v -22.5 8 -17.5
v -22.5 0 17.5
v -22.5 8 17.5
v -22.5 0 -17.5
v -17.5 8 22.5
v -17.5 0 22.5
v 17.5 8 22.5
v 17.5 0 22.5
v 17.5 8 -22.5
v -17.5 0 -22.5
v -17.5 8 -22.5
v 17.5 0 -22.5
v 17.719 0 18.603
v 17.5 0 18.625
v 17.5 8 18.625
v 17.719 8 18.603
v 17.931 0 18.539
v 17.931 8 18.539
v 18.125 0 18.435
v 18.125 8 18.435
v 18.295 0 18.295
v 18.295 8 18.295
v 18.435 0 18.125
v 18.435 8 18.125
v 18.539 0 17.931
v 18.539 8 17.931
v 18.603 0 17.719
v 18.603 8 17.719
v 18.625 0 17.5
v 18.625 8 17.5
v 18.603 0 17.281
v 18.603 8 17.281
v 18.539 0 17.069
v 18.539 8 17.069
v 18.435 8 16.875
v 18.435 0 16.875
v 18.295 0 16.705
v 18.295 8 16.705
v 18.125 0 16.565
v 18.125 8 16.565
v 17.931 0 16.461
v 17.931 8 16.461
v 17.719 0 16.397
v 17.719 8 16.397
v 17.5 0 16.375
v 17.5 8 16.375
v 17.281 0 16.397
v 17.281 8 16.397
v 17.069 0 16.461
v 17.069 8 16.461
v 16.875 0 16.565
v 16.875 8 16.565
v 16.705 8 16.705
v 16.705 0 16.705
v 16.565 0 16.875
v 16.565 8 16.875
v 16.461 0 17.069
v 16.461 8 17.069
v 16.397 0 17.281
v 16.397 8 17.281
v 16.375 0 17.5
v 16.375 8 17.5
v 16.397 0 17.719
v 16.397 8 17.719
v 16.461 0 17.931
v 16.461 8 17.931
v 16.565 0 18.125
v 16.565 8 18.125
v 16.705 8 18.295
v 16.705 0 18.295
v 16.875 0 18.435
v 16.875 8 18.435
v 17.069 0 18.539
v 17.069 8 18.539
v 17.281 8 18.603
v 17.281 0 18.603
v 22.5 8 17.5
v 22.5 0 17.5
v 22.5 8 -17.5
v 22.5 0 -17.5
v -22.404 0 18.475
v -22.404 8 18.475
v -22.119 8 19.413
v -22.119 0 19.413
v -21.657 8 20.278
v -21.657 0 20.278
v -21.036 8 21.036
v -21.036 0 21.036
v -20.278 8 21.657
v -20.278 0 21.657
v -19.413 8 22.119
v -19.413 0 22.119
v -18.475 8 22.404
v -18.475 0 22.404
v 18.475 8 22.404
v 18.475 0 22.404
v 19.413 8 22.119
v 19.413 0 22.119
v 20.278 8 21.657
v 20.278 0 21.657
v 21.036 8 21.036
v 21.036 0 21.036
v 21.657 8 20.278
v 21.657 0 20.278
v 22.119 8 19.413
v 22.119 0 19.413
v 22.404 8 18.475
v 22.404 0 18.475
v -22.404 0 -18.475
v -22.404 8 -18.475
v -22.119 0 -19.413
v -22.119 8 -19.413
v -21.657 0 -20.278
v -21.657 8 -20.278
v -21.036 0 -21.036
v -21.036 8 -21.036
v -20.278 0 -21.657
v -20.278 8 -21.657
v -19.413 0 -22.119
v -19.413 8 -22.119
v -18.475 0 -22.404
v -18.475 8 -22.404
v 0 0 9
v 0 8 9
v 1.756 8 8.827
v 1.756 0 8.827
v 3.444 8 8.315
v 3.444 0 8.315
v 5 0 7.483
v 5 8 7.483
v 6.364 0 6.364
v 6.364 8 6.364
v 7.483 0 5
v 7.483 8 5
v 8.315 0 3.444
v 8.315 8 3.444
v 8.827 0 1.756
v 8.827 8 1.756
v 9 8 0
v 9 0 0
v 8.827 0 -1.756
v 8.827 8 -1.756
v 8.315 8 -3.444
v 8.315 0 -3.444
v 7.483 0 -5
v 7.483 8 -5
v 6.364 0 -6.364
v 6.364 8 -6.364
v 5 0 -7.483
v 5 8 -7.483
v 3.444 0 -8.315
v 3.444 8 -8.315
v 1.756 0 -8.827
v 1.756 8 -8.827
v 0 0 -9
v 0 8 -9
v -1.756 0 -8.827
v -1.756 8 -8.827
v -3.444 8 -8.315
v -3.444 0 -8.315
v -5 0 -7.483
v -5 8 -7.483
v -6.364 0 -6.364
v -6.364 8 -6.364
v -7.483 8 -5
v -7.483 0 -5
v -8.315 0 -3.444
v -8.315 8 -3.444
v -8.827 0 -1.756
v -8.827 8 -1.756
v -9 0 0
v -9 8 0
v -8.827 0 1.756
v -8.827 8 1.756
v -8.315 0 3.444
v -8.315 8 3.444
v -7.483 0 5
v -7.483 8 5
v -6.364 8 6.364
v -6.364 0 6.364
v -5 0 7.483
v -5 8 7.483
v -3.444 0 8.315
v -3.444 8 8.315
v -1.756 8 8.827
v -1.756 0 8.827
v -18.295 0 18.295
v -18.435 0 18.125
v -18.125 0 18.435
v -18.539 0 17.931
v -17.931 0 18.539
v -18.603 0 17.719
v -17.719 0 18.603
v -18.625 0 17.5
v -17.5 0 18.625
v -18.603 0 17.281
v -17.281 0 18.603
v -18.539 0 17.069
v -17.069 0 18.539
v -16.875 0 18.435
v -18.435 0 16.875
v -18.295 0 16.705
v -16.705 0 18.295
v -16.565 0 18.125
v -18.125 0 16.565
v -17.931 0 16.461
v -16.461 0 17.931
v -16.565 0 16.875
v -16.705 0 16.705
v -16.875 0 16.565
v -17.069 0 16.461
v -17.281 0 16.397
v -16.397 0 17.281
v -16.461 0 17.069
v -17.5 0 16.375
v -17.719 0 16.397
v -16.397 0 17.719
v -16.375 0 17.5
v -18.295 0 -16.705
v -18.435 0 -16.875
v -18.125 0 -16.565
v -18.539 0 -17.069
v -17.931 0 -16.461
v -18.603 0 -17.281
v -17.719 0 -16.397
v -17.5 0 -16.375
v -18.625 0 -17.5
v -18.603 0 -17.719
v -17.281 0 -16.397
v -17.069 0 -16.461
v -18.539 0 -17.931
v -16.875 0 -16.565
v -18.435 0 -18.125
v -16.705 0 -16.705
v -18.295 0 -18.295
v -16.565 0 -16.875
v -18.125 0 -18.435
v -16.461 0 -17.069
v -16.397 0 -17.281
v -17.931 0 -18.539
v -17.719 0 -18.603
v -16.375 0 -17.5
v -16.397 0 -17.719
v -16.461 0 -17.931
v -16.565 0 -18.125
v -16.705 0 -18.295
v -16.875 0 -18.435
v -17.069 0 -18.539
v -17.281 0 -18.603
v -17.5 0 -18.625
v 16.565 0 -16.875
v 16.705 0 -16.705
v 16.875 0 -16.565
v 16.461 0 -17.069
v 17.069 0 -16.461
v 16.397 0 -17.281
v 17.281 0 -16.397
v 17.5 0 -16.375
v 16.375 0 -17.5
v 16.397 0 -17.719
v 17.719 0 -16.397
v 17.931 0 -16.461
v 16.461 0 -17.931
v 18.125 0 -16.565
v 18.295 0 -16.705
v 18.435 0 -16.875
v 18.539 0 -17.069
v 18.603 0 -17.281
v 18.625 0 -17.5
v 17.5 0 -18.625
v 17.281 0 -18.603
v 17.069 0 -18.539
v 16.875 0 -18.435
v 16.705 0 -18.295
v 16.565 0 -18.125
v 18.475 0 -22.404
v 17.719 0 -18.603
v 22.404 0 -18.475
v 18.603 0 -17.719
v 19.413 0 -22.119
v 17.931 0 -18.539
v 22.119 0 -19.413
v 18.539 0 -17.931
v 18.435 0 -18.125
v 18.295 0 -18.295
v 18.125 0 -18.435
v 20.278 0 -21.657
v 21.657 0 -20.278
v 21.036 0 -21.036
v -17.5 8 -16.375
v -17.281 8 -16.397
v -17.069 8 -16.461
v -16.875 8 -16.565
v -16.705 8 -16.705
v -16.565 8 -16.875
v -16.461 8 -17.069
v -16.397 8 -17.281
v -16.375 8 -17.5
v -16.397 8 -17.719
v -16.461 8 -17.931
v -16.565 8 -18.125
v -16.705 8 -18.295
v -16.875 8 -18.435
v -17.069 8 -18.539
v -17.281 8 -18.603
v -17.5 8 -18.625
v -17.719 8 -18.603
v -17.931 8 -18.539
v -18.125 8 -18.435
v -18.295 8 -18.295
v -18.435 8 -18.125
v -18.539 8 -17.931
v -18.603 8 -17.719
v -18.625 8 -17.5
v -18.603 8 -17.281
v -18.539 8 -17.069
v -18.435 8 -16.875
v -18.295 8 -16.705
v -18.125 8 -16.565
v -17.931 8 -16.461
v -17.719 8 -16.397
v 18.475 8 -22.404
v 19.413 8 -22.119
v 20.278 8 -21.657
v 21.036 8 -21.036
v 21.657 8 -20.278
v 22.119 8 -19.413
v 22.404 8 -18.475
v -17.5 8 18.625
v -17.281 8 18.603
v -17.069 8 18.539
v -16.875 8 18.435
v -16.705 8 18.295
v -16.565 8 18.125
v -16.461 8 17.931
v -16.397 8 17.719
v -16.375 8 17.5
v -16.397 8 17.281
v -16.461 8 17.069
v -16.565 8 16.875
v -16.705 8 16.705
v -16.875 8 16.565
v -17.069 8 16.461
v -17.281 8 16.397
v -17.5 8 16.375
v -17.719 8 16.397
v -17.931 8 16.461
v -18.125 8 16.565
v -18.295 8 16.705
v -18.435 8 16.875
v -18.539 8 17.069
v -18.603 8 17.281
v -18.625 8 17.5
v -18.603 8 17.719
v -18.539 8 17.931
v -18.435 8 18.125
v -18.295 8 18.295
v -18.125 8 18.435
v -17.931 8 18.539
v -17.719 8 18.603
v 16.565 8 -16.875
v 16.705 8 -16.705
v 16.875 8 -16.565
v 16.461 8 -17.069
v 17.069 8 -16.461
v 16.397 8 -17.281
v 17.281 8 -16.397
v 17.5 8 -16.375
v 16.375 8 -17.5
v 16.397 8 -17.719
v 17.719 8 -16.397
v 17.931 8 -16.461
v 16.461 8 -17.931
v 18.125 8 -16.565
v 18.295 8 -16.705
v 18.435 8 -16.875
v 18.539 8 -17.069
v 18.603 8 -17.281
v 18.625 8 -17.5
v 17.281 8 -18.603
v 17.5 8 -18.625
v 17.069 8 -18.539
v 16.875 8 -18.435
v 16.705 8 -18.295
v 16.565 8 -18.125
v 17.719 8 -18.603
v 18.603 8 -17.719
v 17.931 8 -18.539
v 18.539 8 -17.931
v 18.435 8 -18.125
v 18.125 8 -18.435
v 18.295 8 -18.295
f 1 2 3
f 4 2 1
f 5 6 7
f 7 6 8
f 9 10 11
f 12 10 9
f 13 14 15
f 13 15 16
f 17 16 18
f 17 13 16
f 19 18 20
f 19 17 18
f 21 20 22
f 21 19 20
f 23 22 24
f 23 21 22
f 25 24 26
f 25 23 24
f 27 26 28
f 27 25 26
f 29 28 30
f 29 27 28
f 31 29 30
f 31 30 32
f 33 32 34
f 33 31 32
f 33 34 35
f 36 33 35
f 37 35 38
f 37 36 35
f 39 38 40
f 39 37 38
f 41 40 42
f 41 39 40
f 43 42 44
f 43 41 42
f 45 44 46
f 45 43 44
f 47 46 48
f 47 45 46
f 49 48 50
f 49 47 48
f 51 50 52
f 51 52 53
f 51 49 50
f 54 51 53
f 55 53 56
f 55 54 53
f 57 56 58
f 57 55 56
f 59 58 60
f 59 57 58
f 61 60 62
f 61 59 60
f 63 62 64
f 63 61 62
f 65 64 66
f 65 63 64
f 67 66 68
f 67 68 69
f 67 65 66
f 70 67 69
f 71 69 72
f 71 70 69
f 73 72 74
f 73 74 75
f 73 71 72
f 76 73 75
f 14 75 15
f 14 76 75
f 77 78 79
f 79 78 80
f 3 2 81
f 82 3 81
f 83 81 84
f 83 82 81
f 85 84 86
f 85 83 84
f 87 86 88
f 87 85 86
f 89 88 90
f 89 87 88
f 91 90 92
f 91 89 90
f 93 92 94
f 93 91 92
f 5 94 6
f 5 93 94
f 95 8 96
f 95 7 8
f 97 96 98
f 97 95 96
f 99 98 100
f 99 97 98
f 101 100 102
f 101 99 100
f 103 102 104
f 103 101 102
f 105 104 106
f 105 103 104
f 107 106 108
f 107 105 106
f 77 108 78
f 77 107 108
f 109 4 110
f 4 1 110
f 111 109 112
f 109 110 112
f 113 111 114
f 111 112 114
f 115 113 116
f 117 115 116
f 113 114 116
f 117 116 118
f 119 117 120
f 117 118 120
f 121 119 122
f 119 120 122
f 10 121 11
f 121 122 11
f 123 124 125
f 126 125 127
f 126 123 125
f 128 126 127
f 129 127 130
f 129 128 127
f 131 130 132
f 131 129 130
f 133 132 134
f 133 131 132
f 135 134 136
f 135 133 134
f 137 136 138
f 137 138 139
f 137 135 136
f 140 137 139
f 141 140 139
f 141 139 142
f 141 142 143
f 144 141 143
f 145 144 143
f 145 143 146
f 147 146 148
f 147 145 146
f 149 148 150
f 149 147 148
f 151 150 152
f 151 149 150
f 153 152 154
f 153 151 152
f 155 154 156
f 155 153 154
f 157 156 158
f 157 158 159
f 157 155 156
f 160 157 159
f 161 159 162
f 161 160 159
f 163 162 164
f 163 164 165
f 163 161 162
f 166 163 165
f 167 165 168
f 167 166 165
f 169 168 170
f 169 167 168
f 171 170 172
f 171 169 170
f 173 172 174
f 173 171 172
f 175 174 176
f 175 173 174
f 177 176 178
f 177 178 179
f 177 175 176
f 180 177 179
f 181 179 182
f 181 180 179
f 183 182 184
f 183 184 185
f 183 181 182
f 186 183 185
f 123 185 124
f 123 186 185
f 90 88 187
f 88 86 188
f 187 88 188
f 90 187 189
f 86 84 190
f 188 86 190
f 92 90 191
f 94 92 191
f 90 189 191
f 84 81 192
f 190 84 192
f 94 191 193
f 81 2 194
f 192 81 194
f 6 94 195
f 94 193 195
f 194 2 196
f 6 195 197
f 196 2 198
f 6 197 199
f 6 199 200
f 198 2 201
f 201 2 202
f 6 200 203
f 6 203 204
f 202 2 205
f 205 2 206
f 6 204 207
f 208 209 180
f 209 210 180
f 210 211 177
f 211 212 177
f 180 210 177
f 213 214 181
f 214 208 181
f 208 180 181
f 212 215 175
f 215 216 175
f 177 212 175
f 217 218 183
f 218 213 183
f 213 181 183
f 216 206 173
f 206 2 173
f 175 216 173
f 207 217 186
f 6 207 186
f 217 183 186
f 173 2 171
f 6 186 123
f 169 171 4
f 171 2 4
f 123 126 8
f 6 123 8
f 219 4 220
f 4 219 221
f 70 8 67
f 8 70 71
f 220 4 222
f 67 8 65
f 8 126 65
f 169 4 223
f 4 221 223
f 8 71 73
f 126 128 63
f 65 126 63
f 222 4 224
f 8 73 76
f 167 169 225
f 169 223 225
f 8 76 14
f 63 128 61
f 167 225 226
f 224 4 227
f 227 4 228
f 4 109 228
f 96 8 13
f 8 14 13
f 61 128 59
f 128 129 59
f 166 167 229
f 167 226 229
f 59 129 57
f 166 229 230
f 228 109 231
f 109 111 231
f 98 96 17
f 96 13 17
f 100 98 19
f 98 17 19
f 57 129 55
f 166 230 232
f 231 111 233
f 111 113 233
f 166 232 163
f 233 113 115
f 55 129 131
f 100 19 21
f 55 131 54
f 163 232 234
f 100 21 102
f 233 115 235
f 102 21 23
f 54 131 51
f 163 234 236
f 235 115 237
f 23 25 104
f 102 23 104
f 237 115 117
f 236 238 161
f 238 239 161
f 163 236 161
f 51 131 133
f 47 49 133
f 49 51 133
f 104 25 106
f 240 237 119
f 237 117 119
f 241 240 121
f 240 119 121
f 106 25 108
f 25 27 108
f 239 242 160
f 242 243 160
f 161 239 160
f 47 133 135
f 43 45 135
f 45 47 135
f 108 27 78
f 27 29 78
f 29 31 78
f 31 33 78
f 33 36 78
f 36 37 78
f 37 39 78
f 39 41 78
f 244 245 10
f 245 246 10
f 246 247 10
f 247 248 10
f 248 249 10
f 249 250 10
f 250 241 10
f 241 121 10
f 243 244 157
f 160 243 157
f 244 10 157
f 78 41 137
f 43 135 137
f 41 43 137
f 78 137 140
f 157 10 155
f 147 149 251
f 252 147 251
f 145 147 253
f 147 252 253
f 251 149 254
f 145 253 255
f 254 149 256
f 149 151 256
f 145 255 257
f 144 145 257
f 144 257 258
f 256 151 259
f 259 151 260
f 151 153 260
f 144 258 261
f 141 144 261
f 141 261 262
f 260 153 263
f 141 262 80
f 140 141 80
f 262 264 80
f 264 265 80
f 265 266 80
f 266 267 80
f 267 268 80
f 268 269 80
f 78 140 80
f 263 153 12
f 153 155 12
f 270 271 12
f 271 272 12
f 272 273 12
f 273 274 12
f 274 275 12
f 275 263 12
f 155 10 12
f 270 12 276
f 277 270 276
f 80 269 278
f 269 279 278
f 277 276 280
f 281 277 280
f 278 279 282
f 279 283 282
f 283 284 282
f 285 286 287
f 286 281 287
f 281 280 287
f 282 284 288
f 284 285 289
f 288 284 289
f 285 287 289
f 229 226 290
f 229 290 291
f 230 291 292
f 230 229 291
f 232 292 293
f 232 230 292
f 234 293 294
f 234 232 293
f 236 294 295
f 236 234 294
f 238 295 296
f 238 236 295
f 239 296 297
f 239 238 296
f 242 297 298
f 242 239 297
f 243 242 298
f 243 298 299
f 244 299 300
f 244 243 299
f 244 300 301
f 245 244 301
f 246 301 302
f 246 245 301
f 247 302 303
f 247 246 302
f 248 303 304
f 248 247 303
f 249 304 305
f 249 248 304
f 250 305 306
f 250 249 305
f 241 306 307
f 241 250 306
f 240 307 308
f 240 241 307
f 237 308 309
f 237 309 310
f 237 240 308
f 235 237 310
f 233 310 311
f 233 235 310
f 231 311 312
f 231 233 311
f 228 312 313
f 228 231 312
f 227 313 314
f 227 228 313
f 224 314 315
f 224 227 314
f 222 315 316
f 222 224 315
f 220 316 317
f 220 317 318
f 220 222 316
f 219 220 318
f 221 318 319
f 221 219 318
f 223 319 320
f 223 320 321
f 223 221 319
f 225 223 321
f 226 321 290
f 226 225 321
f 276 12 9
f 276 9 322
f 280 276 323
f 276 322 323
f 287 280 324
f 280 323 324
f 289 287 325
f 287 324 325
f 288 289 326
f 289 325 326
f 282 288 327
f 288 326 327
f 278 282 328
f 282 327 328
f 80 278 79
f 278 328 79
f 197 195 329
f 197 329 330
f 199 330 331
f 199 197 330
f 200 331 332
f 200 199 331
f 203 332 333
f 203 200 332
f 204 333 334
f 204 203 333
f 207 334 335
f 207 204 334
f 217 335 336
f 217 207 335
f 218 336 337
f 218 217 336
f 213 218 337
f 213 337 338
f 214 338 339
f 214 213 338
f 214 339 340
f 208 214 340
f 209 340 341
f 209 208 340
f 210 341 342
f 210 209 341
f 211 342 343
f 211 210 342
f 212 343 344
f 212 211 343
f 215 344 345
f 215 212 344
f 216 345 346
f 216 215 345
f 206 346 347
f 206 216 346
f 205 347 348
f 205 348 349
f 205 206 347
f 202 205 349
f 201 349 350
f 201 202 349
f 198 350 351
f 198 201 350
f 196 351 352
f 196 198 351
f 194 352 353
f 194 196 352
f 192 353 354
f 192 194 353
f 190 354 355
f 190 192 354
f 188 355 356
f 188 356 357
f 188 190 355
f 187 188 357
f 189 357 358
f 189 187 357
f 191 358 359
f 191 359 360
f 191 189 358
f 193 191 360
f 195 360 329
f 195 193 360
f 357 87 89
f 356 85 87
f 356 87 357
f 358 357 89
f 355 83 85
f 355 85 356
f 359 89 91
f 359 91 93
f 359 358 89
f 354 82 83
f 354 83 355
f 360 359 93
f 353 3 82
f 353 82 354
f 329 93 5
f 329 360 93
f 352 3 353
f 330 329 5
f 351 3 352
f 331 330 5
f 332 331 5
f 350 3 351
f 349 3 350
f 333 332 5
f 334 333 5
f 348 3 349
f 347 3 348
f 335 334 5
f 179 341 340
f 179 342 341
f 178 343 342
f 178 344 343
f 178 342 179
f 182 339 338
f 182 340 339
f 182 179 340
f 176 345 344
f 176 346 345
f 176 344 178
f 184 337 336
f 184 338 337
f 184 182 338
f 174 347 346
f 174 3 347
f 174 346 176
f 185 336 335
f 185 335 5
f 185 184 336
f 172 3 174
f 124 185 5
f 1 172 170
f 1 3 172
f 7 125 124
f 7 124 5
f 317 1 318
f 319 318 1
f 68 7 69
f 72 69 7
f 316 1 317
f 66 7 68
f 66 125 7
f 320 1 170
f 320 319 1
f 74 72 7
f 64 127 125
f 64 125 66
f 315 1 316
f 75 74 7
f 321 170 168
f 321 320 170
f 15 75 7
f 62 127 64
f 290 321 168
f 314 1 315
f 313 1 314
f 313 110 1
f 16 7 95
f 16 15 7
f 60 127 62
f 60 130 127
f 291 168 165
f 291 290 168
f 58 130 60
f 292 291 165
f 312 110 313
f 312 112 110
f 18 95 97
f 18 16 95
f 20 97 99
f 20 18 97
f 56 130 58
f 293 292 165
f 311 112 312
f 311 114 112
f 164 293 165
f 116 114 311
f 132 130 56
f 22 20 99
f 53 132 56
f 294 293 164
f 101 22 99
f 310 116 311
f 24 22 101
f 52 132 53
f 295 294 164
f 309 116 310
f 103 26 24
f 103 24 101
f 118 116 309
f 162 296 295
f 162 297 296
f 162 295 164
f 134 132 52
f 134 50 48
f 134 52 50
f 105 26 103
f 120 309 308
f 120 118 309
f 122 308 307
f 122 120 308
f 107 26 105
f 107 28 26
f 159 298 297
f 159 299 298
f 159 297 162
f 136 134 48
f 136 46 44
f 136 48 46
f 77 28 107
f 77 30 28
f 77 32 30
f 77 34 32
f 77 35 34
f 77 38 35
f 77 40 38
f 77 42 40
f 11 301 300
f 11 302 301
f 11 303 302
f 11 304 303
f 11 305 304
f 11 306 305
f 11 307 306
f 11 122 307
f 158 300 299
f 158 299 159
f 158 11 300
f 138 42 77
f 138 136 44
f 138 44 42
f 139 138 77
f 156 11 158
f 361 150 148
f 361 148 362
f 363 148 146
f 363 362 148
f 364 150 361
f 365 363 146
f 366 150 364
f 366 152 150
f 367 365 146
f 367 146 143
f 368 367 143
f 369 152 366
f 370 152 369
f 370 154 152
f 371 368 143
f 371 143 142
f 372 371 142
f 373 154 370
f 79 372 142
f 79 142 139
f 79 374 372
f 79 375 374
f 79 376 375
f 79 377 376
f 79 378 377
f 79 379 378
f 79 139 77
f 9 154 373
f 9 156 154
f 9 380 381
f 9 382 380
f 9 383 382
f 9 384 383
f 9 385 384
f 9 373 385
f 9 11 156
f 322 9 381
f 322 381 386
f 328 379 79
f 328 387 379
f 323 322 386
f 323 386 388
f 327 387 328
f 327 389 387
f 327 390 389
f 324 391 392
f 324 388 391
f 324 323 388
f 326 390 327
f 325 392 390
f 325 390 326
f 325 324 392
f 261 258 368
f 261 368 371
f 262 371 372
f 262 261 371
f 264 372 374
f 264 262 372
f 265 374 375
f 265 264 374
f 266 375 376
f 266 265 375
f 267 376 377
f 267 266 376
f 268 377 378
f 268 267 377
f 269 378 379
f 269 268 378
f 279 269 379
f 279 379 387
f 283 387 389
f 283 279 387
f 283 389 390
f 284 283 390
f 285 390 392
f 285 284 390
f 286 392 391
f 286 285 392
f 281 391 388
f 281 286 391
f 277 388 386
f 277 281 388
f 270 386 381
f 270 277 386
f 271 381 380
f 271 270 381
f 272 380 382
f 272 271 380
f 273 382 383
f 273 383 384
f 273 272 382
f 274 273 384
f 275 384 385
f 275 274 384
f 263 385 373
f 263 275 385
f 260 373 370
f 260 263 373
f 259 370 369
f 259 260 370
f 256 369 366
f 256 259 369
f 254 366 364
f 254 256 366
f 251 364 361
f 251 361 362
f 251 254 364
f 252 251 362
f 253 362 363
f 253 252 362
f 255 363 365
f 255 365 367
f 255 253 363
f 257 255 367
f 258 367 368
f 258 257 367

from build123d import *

# Parameters (mm, degrees)
SKETCH1_W           = 45
SKETCH1_H           = 45
SKETCH1_R           = 9
SKETCH1_R_2         = 1.125
BOSS_EXTRUDE1_DEPTH = 8
FILLET1_R           = 5


with BuildPart() as part:
    # Sketch1 → Boss-Extrude1 (new body)
    with BuildSketch(Plane(origin=(0, 0, 0), x_dir=(1, 0, 0), z_dir=(0, 1, 0))):
        Rectangle(SKETCH1_W, SKETCH1_H)
        with Locations(Location((0, 0, 0), (0, 0, 270))):
            Circle(SKETCH1_R, mode=Mode.SUBTRACT)
        with Locations(Location((-17.5, 17.5, 0), (0, 0, 270))):
            Circle(SKETCH1_R_2, mode=Mode.SUBTRACT)
        with Locations(Location((17.5, 17.5, 0), (0, 0, 270))):
            Circle(SKETCH1_R_2, mode=Mode.SUBTRACT)
        with Locations(Location((17.5, -17.5, 0), (0, 0, 270))):
            Circle(SKETCH1_R_2, mode=Mode.SUBTRACT)
        with Locations(Location((-17.5, -17.5, 0), (0, 0, 270))):
            Circle(SKETCH1_R_2, mode=Mode.SUBTRACT)
    extrude(amount=BOSS_EXTRUDE1_DEPTH)

    # Fillet1
    fillet1_edges = [part.edges().sort_by_distance(p)[0] for p in [
        (-22.5, 4, 22.5),
        (-22.5, 4, -22.5),
        (22.5, 4, -22.5),
        (22.5, 4, 22.5),
    ]]
    fillet(fillet1_edges, radius=FILLET1_R)


solid = part.part
